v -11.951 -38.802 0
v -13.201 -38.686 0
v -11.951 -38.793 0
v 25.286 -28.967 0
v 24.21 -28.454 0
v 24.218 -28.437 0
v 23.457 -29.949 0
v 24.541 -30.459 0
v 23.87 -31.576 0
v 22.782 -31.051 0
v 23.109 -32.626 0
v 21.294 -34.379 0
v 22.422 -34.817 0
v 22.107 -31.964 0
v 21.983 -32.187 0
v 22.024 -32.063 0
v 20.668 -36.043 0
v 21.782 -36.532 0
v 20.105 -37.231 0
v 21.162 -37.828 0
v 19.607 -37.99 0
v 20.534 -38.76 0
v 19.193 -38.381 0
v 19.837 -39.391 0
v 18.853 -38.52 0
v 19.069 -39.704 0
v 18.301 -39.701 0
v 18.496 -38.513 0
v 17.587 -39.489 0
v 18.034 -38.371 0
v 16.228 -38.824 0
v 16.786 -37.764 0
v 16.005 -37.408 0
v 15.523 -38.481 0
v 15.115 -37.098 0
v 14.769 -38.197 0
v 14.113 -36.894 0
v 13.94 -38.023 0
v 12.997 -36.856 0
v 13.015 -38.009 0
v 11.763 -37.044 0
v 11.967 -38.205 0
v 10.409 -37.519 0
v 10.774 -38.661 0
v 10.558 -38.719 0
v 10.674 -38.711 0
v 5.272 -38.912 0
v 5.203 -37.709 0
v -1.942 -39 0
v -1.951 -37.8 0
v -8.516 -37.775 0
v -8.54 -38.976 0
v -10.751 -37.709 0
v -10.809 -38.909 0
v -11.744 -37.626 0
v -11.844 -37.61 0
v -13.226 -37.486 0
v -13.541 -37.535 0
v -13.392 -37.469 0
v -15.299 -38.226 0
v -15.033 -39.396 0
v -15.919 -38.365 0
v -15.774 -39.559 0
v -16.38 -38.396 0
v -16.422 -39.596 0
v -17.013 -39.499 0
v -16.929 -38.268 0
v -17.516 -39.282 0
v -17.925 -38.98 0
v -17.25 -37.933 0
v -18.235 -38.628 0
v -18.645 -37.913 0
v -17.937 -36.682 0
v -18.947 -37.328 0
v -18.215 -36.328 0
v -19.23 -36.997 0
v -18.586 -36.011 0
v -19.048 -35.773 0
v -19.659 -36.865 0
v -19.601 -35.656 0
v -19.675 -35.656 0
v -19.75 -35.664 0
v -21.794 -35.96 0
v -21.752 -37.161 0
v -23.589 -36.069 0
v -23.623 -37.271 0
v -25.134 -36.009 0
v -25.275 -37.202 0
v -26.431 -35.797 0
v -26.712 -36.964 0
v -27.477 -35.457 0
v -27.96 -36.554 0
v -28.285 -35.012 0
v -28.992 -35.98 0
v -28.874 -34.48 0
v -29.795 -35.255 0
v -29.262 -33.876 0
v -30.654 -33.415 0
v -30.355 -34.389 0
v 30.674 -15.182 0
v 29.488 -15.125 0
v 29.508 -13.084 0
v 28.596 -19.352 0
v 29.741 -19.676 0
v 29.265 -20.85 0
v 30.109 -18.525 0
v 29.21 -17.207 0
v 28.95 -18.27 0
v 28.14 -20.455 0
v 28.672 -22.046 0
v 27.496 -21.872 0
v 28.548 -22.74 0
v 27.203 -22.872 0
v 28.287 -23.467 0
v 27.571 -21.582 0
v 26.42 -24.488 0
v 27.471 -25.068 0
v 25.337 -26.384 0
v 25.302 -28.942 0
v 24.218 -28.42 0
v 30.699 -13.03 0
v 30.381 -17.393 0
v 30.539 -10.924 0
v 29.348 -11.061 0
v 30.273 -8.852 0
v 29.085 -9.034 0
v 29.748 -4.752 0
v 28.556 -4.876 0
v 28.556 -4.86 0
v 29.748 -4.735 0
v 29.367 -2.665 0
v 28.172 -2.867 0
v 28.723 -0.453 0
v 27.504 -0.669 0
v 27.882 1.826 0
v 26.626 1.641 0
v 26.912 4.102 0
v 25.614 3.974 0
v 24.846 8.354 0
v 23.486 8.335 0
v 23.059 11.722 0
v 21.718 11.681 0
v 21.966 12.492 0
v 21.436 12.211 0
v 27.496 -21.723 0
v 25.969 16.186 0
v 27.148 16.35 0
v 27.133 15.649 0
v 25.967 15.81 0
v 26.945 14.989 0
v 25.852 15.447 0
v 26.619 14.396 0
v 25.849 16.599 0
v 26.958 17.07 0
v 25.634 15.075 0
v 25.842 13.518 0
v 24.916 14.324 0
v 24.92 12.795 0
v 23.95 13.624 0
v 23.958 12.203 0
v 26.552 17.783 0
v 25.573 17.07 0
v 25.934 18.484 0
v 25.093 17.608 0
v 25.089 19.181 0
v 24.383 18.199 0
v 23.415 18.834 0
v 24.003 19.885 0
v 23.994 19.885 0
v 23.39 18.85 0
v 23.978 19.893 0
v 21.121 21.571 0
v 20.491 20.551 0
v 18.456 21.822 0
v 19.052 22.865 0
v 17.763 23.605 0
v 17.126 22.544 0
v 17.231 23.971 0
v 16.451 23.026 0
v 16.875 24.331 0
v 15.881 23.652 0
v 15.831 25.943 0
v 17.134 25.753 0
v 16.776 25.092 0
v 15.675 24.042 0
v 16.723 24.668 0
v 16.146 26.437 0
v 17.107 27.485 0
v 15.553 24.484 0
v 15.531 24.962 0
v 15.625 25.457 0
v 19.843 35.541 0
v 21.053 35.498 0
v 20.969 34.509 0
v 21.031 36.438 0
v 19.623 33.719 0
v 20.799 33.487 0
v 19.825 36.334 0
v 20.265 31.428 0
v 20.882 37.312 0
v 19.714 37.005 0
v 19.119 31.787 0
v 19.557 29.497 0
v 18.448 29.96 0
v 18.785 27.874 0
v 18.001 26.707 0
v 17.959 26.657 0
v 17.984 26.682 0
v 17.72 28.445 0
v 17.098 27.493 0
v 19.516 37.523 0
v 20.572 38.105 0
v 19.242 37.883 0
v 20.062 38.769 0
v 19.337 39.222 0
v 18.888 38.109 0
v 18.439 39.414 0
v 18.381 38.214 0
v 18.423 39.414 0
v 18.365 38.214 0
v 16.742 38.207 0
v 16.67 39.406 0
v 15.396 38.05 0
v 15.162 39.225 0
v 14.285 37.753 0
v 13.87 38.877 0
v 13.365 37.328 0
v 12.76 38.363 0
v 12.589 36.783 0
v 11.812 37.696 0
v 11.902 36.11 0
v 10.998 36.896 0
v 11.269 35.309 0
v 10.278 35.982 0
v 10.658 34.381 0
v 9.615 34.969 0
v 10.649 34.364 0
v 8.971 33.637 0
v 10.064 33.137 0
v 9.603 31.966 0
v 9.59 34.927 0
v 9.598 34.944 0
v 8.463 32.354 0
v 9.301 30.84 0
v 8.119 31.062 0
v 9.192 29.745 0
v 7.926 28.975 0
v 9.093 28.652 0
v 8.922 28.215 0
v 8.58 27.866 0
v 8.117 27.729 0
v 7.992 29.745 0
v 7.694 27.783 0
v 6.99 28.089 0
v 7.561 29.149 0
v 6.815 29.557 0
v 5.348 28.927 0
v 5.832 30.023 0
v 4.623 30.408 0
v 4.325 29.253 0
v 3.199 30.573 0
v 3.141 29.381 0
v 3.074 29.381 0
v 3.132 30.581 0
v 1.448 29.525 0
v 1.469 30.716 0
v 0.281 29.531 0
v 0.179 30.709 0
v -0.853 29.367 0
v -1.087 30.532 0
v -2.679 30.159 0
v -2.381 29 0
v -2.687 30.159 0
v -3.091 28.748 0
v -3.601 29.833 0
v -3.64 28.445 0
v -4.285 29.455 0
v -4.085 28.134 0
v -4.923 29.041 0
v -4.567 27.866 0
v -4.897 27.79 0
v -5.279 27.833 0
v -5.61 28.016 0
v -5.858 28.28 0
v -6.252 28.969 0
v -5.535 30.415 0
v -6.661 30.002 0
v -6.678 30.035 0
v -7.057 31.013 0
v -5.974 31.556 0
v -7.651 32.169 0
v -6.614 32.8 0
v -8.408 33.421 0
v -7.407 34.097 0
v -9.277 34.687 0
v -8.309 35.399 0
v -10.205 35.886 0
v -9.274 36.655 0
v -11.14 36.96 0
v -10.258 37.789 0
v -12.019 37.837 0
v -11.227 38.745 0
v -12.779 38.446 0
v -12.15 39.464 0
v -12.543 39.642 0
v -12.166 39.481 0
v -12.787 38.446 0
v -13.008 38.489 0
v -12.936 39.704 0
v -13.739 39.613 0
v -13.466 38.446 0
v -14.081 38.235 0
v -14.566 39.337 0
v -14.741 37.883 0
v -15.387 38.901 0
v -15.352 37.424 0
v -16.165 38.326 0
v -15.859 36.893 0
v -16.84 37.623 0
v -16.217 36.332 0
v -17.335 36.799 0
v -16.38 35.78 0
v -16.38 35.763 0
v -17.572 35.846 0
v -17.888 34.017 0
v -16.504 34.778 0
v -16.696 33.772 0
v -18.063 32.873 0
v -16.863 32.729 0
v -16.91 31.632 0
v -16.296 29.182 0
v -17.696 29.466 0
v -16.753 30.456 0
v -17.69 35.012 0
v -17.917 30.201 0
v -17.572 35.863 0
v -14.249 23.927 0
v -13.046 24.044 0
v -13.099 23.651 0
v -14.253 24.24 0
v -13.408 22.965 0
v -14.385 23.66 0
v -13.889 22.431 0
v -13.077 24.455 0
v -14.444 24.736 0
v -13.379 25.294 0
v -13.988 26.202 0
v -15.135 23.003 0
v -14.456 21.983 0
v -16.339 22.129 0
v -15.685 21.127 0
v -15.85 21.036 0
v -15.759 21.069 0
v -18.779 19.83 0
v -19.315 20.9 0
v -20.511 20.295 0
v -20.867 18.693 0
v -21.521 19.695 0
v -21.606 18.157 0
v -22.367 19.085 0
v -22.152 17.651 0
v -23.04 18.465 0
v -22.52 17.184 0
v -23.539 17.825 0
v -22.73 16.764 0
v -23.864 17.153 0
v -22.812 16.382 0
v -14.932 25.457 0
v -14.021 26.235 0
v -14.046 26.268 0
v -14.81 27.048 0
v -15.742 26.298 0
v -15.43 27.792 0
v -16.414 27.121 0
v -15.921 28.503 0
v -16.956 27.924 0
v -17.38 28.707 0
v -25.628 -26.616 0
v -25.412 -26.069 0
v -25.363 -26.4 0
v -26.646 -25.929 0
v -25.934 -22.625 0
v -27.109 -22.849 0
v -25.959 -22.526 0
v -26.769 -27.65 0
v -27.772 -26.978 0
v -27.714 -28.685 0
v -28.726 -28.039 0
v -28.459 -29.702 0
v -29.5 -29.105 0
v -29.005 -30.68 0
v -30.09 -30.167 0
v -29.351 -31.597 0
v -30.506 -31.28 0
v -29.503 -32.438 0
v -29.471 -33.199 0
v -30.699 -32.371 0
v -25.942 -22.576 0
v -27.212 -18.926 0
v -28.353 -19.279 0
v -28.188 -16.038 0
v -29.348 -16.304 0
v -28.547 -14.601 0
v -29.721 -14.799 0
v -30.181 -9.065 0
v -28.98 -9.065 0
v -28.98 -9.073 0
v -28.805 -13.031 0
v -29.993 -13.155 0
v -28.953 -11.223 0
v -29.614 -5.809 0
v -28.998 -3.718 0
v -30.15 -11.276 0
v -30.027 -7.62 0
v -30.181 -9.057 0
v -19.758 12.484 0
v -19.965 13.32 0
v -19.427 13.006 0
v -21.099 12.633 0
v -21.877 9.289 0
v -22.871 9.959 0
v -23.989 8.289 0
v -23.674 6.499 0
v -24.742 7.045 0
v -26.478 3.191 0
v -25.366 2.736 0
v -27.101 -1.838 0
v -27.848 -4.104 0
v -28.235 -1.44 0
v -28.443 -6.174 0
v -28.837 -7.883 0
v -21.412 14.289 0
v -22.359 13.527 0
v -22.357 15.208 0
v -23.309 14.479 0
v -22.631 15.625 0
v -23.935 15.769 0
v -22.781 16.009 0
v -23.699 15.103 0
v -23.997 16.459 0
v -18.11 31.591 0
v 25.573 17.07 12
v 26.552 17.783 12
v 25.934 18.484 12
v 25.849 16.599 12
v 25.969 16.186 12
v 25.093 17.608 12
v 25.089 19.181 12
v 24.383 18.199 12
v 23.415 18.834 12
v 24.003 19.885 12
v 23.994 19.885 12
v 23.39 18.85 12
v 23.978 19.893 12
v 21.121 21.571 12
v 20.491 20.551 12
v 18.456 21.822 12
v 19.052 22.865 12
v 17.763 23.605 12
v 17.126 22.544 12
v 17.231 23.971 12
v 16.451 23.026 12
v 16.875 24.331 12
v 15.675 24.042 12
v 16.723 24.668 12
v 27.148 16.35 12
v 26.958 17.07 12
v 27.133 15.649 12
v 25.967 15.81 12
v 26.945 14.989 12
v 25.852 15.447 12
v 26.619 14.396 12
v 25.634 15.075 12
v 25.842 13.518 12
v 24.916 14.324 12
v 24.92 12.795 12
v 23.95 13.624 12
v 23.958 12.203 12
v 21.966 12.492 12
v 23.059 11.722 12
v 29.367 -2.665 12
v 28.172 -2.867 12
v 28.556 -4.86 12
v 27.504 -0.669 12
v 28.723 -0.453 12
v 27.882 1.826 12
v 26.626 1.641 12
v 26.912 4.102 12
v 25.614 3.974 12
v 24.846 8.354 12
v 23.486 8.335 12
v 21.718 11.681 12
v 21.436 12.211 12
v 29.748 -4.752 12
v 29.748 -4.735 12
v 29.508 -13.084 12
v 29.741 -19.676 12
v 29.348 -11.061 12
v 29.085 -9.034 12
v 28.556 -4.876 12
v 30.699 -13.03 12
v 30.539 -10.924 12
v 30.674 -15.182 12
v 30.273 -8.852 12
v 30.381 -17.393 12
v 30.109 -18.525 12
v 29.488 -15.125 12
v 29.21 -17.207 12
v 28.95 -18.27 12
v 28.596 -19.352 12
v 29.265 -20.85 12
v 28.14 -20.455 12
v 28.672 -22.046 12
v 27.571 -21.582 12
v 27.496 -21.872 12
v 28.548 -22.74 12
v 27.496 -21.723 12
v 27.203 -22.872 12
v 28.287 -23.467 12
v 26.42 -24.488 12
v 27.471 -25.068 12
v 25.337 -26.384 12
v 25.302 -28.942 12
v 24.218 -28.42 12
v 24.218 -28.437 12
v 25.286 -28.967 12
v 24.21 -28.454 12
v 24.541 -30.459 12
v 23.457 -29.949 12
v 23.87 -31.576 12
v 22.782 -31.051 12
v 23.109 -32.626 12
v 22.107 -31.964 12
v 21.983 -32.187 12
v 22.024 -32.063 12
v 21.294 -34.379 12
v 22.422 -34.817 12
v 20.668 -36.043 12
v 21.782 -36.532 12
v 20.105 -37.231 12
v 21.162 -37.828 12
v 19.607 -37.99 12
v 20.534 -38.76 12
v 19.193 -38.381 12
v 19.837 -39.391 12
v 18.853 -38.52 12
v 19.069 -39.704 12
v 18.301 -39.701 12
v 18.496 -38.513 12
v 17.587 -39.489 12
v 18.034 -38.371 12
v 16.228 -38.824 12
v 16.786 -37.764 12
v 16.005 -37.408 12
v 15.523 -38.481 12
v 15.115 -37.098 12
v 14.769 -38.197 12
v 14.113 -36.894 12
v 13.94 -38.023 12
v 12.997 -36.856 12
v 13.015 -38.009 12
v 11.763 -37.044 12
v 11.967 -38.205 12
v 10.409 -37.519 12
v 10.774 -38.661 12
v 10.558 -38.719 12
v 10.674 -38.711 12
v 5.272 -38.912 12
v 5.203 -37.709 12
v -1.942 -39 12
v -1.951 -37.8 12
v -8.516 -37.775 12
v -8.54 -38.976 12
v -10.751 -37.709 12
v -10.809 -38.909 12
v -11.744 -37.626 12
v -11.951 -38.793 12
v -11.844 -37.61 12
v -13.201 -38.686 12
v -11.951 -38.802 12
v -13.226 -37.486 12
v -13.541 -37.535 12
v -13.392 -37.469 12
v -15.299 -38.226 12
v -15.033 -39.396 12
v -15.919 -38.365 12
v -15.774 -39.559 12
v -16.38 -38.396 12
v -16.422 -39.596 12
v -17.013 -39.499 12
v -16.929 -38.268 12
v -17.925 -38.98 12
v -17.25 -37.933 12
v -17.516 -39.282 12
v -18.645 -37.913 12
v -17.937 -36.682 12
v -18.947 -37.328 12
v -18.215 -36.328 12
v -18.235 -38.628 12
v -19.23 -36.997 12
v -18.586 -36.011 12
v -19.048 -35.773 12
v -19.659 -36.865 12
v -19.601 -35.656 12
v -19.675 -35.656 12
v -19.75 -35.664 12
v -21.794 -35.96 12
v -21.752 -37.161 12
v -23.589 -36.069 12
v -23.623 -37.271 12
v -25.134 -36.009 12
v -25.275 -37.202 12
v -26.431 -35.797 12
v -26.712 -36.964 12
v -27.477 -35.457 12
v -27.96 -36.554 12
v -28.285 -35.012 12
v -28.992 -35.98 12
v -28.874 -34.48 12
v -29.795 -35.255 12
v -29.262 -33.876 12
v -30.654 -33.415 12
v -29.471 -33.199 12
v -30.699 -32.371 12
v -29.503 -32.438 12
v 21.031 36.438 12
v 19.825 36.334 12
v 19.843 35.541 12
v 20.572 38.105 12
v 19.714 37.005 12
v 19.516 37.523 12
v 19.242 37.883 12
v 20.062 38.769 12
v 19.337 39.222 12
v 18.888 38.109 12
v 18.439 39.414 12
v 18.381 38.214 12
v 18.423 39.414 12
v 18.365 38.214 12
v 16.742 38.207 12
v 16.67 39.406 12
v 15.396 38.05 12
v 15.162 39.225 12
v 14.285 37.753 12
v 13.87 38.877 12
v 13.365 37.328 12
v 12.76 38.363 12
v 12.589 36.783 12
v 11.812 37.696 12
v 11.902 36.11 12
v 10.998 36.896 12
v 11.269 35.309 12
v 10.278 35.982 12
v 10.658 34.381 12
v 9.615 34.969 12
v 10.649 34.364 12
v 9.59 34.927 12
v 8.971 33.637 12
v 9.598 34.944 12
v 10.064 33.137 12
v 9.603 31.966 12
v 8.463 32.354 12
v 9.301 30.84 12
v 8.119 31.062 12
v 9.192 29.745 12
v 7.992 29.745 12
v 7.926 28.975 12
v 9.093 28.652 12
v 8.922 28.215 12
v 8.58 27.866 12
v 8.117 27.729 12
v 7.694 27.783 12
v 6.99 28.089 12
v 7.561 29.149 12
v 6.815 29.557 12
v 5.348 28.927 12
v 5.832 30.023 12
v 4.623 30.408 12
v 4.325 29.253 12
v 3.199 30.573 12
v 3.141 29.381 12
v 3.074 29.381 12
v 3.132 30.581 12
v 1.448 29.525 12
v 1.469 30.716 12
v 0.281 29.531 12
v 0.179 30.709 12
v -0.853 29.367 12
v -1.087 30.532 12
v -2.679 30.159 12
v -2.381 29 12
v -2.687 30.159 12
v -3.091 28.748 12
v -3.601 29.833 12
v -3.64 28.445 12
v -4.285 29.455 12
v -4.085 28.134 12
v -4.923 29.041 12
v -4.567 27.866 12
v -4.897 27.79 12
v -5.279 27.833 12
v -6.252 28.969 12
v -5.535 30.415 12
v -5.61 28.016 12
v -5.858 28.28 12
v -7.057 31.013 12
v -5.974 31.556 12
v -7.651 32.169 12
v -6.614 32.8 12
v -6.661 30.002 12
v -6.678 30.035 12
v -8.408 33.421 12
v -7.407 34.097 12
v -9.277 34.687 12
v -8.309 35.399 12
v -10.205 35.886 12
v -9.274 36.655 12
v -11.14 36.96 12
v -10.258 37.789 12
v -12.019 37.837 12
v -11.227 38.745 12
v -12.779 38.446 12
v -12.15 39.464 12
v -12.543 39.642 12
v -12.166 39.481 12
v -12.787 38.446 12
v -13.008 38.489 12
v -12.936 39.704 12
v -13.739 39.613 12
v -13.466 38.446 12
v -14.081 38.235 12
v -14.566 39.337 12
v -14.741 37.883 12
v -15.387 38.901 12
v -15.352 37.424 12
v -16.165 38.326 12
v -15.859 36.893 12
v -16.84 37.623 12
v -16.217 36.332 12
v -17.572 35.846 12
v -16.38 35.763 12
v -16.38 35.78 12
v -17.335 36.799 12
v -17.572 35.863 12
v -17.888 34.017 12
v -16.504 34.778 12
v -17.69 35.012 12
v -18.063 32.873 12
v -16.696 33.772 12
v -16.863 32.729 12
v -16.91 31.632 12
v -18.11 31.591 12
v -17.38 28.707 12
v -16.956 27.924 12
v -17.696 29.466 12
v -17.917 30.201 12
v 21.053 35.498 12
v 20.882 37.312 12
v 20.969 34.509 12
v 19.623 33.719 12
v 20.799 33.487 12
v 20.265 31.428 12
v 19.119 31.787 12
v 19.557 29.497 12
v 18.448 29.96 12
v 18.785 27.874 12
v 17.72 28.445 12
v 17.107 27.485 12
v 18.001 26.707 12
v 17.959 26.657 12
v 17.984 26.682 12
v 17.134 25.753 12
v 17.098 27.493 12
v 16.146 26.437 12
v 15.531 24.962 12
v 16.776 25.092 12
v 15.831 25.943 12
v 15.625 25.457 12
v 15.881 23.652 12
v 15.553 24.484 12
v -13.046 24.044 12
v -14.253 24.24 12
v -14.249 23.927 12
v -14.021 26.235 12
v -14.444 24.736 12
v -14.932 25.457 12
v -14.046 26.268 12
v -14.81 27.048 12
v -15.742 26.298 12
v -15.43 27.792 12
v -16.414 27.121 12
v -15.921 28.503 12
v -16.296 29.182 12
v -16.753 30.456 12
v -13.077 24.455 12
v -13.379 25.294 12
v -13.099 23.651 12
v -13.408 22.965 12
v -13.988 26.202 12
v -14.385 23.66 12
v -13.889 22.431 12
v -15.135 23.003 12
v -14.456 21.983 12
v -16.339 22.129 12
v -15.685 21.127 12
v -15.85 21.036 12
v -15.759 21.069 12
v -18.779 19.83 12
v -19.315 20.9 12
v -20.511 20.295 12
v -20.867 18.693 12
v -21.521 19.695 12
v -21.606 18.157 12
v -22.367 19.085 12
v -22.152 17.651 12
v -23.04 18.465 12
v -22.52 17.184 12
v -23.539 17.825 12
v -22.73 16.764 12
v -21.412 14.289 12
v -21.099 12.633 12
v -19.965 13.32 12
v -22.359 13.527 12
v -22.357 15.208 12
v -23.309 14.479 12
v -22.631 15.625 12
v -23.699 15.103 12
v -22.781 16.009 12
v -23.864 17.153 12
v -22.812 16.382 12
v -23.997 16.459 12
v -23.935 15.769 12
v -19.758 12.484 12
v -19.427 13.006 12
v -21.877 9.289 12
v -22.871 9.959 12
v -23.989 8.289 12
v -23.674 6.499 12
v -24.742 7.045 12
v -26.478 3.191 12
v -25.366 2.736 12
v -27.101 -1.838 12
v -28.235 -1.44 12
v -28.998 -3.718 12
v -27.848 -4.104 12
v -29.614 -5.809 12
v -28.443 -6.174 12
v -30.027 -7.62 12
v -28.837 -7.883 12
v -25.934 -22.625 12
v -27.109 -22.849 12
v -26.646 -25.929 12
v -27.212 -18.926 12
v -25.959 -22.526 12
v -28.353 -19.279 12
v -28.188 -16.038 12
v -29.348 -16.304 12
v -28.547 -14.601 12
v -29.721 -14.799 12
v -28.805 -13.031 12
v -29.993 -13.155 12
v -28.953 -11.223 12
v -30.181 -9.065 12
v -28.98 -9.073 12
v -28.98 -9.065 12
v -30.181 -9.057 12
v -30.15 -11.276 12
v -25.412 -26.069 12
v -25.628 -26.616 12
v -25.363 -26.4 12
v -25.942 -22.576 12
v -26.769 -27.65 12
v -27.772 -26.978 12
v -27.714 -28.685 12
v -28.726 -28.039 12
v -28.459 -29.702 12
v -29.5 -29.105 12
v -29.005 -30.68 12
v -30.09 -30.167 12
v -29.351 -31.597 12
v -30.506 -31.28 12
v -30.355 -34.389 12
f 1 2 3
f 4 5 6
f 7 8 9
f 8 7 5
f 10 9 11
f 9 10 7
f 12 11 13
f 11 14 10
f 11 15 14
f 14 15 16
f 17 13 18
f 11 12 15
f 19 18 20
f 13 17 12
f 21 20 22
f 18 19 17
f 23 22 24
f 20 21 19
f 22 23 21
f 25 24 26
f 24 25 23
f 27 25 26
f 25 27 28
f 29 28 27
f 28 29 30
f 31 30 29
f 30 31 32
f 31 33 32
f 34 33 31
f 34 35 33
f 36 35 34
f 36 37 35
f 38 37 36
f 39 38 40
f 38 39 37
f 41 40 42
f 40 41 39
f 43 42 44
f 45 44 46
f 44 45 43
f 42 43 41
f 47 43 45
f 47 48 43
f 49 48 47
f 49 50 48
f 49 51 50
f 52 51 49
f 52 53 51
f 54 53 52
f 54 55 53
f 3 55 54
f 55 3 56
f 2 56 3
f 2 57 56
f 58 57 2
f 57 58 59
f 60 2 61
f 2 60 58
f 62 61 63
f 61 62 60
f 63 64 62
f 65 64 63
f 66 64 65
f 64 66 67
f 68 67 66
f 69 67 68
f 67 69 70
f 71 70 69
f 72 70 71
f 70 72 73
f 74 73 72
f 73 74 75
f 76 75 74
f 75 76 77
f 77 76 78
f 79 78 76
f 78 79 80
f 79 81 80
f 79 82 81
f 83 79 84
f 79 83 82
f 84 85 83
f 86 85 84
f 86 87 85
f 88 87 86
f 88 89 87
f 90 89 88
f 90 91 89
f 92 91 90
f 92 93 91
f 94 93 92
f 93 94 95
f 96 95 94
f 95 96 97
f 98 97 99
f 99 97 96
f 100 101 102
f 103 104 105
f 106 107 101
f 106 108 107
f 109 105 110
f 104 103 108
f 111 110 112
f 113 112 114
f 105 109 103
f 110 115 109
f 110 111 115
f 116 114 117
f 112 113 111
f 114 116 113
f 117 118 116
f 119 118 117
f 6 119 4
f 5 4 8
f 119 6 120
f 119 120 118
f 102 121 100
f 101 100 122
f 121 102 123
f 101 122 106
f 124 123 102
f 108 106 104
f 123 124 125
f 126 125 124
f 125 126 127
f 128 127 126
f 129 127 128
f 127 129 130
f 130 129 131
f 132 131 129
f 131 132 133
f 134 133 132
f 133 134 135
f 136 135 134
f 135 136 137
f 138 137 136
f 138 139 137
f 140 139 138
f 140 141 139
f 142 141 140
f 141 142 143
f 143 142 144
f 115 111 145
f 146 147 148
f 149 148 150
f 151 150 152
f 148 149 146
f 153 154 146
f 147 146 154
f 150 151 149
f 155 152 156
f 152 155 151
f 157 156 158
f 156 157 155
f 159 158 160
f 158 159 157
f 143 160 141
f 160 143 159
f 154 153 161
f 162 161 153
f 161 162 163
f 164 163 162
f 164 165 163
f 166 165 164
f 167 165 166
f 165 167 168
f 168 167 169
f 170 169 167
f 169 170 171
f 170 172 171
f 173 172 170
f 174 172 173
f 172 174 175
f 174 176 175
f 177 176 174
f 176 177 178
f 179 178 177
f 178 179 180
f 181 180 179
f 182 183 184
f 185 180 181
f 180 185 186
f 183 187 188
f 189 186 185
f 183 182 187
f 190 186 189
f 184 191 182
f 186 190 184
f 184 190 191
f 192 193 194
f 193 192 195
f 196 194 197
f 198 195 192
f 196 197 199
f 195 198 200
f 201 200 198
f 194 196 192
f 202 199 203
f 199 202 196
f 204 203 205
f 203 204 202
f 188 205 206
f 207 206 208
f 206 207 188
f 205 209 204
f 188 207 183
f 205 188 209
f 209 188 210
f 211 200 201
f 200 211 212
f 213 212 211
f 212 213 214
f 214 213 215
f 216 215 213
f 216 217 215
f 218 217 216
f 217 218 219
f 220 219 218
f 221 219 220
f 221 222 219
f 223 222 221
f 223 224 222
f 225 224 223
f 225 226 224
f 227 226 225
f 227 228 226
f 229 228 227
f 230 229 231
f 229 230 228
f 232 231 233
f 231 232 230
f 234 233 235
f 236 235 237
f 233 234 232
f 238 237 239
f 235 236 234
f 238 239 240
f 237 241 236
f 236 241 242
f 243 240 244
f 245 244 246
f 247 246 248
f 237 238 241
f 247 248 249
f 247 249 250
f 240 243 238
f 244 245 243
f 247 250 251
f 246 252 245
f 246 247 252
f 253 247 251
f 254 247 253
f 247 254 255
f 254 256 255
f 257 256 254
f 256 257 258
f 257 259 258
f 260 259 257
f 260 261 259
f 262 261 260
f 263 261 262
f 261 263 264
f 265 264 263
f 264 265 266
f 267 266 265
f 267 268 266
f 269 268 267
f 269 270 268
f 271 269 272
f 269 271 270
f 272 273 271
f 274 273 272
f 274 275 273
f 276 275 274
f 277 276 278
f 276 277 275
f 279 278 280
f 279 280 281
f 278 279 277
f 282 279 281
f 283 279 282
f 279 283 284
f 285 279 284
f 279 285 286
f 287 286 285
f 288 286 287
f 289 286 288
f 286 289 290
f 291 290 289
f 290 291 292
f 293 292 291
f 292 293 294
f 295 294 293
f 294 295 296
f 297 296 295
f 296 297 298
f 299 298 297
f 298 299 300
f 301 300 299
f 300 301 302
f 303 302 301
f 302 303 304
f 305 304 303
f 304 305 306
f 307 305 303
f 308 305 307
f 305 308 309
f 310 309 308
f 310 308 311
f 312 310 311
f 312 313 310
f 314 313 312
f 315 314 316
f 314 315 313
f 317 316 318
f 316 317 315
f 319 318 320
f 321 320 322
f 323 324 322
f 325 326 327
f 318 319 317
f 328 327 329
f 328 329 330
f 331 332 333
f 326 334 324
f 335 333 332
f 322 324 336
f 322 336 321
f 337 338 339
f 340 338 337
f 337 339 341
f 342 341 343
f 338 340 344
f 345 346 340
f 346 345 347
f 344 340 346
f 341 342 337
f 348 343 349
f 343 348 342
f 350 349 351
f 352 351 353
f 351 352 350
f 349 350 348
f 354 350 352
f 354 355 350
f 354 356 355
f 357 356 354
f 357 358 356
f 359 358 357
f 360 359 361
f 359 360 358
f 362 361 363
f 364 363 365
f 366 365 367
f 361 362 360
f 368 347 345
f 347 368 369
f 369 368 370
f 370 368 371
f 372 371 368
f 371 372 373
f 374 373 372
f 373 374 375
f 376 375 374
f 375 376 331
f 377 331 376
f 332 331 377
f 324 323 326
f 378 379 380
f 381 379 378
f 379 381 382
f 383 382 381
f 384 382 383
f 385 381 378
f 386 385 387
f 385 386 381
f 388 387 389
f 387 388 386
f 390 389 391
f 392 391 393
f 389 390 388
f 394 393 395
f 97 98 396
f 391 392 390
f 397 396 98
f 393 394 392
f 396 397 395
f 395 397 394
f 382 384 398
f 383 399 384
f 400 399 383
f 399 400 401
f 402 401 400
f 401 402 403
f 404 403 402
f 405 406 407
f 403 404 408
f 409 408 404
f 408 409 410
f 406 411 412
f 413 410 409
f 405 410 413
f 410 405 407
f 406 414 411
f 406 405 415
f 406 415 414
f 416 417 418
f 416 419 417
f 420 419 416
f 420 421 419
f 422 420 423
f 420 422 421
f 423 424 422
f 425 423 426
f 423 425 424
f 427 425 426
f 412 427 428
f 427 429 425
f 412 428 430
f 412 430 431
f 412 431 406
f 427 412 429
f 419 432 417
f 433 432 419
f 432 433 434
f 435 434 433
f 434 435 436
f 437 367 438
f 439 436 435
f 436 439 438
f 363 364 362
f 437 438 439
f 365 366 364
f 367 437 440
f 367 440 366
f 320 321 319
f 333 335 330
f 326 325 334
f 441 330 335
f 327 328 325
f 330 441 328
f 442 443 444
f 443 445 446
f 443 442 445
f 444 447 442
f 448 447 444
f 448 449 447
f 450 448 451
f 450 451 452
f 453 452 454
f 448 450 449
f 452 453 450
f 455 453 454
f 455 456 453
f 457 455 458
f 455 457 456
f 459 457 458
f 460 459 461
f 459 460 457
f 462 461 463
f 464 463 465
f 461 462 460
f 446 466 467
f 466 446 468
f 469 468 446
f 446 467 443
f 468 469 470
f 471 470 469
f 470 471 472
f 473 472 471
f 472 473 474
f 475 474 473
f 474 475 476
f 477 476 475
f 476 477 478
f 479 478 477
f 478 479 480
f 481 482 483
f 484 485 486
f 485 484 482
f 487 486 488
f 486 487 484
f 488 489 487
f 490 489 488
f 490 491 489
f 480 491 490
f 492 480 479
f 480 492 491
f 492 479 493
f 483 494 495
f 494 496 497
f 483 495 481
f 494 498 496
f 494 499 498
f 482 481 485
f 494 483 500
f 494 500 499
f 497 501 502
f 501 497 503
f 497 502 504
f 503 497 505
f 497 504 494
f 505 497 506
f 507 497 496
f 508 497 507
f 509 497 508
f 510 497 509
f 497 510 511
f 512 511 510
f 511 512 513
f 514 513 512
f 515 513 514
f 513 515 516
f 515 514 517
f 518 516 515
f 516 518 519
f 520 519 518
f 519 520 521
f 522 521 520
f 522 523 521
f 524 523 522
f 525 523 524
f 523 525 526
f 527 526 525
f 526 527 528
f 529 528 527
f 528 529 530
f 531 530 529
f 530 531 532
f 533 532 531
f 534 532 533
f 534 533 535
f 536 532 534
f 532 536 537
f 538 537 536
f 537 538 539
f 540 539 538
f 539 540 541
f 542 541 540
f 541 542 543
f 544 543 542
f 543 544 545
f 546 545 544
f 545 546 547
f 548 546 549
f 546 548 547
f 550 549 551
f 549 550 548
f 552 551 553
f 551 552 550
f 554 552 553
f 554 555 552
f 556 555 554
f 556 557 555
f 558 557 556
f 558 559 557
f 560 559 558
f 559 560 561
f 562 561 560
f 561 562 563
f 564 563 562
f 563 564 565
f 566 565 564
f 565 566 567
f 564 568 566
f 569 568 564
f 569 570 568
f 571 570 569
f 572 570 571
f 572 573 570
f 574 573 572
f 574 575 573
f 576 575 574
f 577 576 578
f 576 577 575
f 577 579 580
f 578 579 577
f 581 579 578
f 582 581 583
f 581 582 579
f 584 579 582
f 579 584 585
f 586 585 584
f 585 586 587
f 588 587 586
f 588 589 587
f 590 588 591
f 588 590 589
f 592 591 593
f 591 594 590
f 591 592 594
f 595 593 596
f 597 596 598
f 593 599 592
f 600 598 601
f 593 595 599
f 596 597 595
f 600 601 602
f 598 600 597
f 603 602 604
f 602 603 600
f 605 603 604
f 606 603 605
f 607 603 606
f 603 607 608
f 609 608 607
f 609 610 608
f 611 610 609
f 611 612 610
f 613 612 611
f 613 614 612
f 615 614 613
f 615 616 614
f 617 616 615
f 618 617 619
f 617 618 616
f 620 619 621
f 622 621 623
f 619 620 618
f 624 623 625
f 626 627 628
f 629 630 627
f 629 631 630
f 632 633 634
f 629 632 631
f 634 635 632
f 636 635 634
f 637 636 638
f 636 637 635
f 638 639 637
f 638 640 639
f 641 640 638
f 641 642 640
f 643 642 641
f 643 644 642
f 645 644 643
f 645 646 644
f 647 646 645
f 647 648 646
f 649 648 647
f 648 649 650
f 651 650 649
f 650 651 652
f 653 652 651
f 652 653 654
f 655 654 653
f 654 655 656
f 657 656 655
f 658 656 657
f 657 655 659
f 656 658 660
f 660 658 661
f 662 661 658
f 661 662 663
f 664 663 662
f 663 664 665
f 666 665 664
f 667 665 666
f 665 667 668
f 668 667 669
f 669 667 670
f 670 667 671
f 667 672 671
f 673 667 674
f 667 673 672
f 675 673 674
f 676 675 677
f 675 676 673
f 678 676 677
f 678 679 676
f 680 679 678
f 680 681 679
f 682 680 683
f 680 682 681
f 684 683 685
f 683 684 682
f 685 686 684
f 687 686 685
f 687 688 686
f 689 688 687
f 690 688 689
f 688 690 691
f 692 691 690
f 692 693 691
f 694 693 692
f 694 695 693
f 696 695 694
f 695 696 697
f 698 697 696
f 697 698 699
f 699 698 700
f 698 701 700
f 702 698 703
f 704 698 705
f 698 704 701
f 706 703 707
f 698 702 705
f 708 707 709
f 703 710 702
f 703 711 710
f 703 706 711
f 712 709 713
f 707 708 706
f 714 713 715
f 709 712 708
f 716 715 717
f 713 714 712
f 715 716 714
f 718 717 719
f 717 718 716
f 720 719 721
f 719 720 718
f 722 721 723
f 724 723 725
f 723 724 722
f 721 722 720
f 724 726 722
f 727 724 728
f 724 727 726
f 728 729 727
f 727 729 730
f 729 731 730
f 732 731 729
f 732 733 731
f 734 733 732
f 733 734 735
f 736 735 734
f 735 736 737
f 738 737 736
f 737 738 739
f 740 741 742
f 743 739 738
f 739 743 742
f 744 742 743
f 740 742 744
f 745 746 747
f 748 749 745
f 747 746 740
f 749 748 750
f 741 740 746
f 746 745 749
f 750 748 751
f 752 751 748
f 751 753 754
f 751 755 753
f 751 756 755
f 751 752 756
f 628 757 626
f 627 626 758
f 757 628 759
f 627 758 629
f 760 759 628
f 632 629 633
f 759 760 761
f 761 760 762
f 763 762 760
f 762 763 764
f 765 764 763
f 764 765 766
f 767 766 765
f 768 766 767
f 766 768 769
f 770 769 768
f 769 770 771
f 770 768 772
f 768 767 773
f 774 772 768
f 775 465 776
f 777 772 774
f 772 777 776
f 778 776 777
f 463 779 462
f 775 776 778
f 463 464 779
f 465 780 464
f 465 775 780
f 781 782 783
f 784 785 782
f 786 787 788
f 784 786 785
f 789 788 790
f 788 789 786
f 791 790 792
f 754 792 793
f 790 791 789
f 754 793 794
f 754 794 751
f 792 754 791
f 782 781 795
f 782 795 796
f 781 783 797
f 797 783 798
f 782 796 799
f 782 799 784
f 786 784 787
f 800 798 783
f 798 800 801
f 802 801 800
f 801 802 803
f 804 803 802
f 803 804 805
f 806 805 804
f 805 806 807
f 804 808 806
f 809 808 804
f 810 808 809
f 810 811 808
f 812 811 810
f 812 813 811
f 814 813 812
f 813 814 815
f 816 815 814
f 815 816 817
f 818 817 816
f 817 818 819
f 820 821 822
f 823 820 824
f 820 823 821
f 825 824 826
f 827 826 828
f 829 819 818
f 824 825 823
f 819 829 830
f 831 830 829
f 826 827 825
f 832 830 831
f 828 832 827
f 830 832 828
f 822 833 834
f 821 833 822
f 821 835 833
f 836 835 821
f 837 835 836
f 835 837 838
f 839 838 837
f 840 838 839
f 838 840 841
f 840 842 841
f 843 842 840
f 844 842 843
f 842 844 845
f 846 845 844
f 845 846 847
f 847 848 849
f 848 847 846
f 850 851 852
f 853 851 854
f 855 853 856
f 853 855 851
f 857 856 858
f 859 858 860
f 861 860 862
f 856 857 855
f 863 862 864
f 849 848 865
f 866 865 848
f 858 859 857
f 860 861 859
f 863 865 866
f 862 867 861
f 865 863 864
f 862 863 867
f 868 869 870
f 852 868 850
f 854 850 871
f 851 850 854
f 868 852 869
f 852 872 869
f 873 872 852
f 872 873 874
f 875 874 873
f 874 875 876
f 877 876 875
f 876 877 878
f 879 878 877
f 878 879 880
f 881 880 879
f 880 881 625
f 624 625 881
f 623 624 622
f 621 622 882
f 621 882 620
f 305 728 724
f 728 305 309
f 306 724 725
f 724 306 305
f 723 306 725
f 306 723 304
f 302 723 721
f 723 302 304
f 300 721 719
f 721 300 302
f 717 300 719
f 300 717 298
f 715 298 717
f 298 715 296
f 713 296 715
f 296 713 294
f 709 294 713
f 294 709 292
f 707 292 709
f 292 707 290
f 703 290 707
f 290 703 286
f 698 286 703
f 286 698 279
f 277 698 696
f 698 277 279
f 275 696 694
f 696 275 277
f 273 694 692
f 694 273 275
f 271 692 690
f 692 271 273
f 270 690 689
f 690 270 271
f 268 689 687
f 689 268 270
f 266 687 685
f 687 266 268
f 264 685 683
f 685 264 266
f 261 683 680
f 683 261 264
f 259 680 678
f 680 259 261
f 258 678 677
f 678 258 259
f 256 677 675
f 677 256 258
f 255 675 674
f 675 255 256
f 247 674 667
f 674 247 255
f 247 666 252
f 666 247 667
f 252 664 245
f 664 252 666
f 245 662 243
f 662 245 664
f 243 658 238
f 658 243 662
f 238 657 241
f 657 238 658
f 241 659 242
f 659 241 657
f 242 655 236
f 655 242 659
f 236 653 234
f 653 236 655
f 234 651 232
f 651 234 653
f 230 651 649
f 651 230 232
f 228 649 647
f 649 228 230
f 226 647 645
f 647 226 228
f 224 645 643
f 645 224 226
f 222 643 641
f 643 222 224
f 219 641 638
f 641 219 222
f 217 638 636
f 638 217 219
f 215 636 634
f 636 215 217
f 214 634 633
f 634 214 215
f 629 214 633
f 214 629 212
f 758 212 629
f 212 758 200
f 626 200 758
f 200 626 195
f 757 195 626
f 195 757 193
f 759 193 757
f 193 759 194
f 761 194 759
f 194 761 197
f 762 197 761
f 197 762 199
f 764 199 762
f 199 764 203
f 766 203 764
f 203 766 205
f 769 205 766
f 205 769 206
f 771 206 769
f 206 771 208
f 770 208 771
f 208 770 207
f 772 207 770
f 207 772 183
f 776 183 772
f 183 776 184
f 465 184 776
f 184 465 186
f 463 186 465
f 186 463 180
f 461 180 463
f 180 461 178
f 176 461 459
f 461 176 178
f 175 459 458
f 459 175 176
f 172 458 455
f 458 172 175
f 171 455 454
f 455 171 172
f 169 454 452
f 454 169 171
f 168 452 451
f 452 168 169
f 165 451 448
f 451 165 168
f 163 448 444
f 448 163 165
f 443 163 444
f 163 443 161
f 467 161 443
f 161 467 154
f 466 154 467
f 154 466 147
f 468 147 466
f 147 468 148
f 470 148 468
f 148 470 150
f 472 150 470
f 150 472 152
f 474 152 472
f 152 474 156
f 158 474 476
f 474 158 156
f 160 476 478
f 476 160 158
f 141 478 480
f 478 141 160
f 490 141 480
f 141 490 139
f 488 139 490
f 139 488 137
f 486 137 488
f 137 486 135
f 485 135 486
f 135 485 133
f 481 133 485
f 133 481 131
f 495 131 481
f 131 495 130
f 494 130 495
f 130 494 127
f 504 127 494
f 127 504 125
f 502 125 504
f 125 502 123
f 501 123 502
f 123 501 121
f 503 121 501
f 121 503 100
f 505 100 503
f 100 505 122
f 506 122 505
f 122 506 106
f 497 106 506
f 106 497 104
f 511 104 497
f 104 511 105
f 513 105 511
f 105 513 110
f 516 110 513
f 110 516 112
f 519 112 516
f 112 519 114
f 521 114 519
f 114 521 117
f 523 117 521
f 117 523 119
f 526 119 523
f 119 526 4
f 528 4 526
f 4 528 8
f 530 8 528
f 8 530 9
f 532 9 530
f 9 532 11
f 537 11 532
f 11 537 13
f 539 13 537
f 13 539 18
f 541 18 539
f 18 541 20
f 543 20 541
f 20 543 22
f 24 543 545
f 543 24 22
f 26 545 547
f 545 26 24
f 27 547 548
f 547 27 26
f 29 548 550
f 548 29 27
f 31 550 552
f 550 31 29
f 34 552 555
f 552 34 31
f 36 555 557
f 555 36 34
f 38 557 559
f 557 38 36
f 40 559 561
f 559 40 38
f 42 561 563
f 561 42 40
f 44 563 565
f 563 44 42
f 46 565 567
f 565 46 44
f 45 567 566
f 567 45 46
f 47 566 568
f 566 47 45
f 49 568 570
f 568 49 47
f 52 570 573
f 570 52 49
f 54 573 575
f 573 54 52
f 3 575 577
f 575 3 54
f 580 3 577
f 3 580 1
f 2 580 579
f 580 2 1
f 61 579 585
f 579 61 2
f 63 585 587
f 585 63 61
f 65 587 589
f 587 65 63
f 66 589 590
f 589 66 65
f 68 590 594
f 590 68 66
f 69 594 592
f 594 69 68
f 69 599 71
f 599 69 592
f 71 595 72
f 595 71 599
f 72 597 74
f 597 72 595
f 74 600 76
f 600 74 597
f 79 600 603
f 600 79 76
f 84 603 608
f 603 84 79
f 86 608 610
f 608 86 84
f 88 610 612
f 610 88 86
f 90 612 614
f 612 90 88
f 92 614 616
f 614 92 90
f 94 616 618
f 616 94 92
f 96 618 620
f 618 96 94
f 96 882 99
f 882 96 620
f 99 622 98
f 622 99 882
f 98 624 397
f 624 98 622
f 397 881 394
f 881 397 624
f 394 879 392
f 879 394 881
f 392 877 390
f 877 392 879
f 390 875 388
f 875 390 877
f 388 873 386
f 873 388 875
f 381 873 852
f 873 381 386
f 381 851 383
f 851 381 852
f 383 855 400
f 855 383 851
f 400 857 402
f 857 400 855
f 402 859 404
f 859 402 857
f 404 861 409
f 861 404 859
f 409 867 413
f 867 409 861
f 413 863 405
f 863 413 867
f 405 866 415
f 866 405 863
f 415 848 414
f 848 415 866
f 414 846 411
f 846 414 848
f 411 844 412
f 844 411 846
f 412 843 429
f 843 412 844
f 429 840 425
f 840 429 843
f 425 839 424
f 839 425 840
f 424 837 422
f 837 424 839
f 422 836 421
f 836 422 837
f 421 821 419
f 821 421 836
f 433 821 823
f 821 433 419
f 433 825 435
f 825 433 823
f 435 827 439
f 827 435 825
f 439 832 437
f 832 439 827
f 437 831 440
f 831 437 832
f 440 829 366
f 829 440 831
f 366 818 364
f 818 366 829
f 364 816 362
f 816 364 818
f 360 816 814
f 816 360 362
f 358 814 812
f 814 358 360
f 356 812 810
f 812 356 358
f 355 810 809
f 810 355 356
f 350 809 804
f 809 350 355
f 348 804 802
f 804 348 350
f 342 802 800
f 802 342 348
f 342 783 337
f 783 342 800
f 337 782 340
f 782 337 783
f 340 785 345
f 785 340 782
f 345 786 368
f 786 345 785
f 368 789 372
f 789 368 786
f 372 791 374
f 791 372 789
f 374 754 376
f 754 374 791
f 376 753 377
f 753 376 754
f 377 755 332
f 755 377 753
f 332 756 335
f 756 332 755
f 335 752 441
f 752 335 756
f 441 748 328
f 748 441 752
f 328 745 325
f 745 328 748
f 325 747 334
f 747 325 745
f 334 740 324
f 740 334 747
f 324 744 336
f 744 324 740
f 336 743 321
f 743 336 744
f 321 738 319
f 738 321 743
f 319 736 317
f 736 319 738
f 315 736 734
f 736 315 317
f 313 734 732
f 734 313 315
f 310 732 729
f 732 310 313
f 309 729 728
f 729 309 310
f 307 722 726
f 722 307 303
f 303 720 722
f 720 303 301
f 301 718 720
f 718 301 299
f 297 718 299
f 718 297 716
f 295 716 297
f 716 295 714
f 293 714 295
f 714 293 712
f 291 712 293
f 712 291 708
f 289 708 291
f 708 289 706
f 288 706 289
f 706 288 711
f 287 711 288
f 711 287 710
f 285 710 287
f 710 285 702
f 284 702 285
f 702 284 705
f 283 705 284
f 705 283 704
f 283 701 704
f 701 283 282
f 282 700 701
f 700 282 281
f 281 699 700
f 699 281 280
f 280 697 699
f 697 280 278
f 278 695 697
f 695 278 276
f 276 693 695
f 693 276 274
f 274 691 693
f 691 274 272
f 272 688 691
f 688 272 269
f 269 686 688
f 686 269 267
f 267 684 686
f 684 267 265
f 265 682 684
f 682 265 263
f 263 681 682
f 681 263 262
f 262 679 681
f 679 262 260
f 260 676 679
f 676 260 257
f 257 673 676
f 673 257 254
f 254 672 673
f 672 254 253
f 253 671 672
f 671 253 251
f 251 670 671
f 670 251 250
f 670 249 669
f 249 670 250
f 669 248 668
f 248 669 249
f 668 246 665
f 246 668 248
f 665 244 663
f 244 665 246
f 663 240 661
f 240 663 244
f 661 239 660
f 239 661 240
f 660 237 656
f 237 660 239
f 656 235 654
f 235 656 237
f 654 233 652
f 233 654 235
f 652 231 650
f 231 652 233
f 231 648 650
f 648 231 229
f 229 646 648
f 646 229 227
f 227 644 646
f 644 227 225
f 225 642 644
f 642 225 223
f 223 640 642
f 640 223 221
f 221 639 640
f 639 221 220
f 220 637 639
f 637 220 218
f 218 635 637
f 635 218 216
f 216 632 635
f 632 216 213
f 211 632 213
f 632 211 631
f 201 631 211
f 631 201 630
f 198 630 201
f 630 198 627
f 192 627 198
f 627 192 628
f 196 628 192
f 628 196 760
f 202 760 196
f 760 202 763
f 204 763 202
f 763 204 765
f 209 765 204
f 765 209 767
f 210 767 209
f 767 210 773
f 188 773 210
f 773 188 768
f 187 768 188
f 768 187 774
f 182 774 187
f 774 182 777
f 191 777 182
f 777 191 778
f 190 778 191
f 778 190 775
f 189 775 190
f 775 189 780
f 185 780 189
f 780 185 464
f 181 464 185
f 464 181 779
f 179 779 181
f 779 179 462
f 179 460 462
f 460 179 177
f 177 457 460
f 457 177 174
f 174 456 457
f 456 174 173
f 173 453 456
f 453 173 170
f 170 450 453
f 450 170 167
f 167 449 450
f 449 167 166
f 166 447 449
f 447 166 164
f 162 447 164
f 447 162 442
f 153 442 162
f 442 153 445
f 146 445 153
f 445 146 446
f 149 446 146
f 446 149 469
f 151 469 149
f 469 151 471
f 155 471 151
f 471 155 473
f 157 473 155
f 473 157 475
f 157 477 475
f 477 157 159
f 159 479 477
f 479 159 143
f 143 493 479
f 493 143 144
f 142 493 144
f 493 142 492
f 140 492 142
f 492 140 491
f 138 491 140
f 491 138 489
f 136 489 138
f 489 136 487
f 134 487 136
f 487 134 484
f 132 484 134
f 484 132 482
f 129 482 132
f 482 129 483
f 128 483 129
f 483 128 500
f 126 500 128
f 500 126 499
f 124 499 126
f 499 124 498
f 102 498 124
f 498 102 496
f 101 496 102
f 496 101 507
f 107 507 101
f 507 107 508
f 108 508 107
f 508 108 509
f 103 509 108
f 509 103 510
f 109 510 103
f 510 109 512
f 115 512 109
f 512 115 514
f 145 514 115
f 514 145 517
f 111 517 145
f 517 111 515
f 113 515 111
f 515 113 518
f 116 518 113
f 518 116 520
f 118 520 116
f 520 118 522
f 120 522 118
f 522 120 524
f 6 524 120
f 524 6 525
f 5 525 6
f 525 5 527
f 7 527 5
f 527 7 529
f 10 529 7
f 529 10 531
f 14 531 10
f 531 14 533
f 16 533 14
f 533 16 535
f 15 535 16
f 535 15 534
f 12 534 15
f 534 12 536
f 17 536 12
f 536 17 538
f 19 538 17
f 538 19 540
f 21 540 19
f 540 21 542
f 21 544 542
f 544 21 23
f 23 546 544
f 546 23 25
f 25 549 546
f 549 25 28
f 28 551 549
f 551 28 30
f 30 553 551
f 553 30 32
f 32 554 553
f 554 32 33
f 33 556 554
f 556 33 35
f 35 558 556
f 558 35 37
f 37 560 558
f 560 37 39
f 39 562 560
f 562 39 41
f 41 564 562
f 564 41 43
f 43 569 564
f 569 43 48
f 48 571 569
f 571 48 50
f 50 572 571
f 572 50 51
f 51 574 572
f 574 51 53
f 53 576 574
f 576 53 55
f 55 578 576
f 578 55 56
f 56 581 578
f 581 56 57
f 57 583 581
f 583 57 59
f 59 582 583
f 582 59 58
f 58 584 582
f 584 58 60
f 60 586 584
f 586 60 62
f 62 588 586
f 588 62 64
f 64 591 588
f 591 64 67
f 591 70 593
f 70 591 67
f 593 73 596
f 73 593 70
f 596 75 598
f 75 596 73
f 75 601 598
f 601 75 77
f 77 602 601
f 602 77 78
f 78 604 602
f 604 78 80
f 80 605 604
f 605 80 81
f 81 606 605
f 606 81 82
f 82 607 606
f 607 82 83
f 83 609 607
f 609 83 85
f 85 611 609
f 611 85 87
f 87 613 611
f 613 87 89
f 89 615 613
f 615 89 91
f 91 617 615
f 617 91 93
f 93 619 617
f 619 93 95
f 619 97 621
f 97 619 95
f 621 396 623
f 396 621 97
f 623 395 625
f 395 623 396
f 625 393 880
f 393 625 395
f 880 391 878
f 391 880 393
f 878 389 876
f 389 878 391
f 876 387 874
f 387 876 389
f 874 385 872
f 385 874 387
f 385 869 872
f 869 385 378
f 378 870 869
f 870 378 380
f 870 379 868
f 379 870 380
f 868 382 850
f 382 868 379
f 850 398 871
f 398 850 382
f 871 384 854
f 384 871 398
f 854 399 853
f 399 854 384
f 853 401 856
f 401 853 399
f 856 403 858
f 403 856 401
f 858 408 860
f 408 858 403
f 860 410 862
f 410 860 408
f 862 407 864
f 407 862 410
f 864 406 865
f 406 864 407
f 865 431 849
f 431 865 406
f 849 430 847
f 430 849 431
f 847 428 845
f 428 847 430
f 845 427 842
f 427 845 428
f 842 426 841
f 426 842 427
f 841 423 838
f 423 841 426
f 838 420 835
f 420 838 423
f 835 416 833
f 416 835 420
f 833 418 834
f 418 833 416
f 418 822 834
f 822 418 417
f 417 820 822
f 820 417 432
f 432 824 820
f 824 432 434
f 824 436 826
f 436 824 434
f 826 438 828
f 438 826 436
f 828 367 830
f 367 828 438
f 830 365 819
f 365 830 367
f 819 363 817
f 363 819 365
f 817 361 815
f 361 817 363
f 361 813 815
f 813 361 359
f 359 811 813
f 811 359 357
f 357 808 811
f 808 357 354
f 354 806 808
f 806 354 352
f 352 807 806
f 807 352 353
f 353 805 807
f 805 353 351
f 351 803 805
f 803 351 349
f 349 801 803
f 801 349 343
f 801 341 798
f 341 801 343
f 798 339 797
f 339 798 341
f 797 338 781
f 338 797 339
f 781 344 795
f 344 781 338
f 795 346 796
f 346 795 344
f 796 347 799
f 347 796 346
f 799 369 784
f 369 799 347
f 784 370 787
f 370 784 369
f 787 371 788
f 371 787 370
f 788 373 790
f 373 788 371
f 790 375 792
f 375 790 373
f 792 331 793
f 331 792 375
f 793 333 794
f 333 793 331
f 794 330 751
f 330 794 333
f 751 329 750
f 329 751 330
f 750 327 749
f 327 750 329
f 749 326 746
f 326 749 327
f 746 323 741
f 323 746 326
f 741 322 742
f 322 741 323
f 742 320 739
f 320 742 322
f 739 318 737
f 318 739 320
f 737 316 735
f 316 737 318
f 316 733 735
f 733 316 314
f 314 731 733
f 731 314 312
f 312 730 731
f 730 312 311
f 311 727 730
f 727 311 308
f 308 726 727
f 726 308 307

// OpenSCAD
// Module names are of the form poly_<inkscape-path-id>().  As a result,
// you can associate a polygon in this OpenSCAD program with the corresponding
// SVG element in the Inkscape document by looking for the XML element with
// the attribute id="inkscape-path-id".

// fudge value is used to ensure that subtracted solids are a tad taller
// in the z dimension than the polygon being subtracted from.  This helps
// keep the resulting .stl file manifold.
fudge = 0.1;

module poly_path299304(h)
{
  scale([25.4/90, -25.4/90, 1]) union()
  {
    difference()
    {
       linear_extrude(height=h)
         polygon([[-45.837548,-140.683937],[-48.682907,-140.361267],[-51.610657,-139.381749],[-54.520293,-137.838578],[-57.276546,-135.802447],[-59.669335,-133.310461],[-61.423621,-130.391176],[-62.264362,-127.073147],[-62.264362,-127.043813],[-62.264362,-127.014480],[-62.680427,-124.058099],[-63.383811,-120.532224],[-64.004142,-116.478110],[-64.171046,-111.937010],[-63.483980,-107.010576],[-62.703925,-104.406612],[-61.581806,-101.716199],[-60.079336,-98.944876],[-58.158227,-96.098179],[-55.780192,-93.181646],[-52.906945,-90.200814],[-51.179173,-87.646432],[-50.501590,-85.888775],[-50.488117,-84.780420],[-50.970927,-83.835423],[-53.628989,-81.505860],[-57.893656,-78.408708],[-68.437423,-74.053404],[-72.676111,-71.912788],[-76.256489,-69.784630],[-79.252182,-67.625602],[-81.636779,-65.428602],[-83.406583,-63.158263],[-84.557897,-60.779215],[-85.028408,-58.319491],[-84.807975,-55.875578],[-83.971166,-53.514795],[-82.592546,-51.304463],[-79.226005,-47.930201],[-74.760475,-44.763071],[-81.037865,-35.288319],[-85.001948,-29.369186],[-87.667258,-24.962892],[-93.818769,-11.305643],[-100.046037,5.104046],[-102.747436,13.173924],[-104.930823,20.583630],[-106.395165,27.000272],[-106.939432,32.090956],[-106.939432,32.120243],[-106.831124,39.954021],[-106.272810,46.613104],[-105.310630,52.437879],[-103.990725,57.768733],[-100.462303,68.310227],[-96.056668,80.960684],[-94.413986,91.872782],[-98.405008,95.590110],[-101.784275,99.351348],[-104.529092,103.128004],[-106.616763,106.891585],[-108.090478,110.834962],[-108.776342,114.698807],[-108.617085,118.399075],[-107.555438,121.851720],[-105.574310,124.918119],[-102.728797,127.488196],[-99.069909,129.520722],[-94.648655,130.974469],[-89.556953,131.818086],[-83.704073,132.060867],[-77.075429,131.672447],[-69.656429,130.622466],[-68.137147,131.091402],[-67.133740,132.265147],[-66.064585,134.337804],[-64.611050,136.870522],[-63.512879,138.117234],[-62.064638,139.188533],[-60.283589,139.958835],[-58.186992,140.302553],[-55.893129,140.169155],[-53.267782,139.593304],[-46.776223,137.075857],[-42.346849,137.486527],[-42.346849,137.457241],[-38.298813,137.867911],[-30.261407,138.102580],[-6.882529,138.190534],[18.681619,137.877020],[37.411204,137.193191],[37.821874,137.163905],[38.173877,136.987903],[42.402534,135.371545],[46.114450,134.677326],[49.395000,134.727465],[52.329561,135.344185],[55.003508,136.349704],[57.502218,137.566243],[62.315429,139.921263],[64.846093,140.673590],[67.566143,140.683937],[70.290045,139.576024],[72.758190,137.339906],[74.981751,134.035121],[77.180776,129.445489],[79.449195,123.369016],[81.880939,115.603710],[84.577939,111.883545],[86.955182,107.926084],[89.595675,102.638260],[89.654342,102.550306],[97.339745,88.822182],[100.228067,83.149963],[101.153832,80.574367],[101.593117,78.115419],[103.694458,73.876276],[105.380381,69.719133],[106.686675,65.638113],[107.649129,61.627338],[108.685678,53.793010],[108.776342,46.169125],[108.207439,38.708659],[107.265284,31.364587],[105.406484,16.837532],[105.406484,16.808246],[105.406484,16.778959],[104.055488,9.441936],[101.773099,1.606386],[98.794772,-6.471625],[95.355961,-14.536030],[88.038697,-29.599749],[81.704937,-41.536234],[84.889985,-43.240677],[88.299437,-45.335483],[91.565001,-47.899353],[94.318384,-51.010986],[95.474469,-53.112320],[96.139784,-55.447572],[96.195068,-57.933220],[95.521062,-60.485739],[94.083656,-63.011113],[91.893708,-65.493078],[88.899413,-67.964728],[85.048967,-70.459162],[85.019681,-70.459162],[84.961013,-70.488449],[74.839793,-76.433688],[67.507523,-81.019210],[62.939087,-83.640494],[61.053908,-84.937529],[59.792786,-86.211257],[59.254834,-87.407018],[59.440783,-88.909948],[60.711315,-91.249821],[63.635488,-94.453998],[63.723441,-94.541999],[63.782109,-94.630000],[66.562182,-98.765667],[69.296825,-104.515422],[71.805140,-111.359053],[73.696865,-118.654217],[74.298486,-122.275295],[74.598442,-125.781108],[74.520944,-129.111506],[73.990201,-132.206339],[72.893553,-135.017103],[71.086175,-137.369052],[68.515482,-138.974662],[65.336789,-139.657073],[65.307503,-139.657073],[65.278216,-139.657073],[59.065191,-139.625847],[53.724884,-138.987578],[49.145198,-137.752715],[45.214035,-135.931706],[41.853621,-133.567085],[38.968301,-130.734417],[36.419156,-127.493700],[34.067268,-123.904931],[34.008600,-123.816930],[33.979314,-123.758263],[31.786731,-119.187454],[29.985962,-114.641678],[28.766523,-110.063486],[28.317929,-105.395430],[28.083261,-102.667406],[26.792582,-103.283411],[24.148581,-104.730954],[20.666131,-106.380703],[16.382205,-107.743151],[11.333776,-108.328790],[11.099107,-108.358124],[5.206495,-108.835740],[0.635067,-108.810998],[-3.852388,-108.185815],[-9.493079,-106.862110],[-9.522365,-106.862110],[-12.758044,-105.706017],[-15.183750,-104.368754],[-17.442437,-102.902074],[-19.613123,-107.771452],[-21.168582,-111.813413],[-23.434471,-116.219669],[-26.246374,-120.816523],[-29.439878,-125.430278],[-32.862120,-129.879192],[-36.347386,-133.898163],[-39.781595,-137.283891],[-43.050668,-139.833075],[-43.079955,-139.862408],[-43.109241,-139.891742],[-44.445034,-140.463494],[-45.837266,-140.683749]]);
       translate([0, 0, -fudge])
         linear_extrude(height=h+2*fudge)
           polygon([[-47.714898,-136.225230],[-46.089630,-136.378318],[-45.309543,-136.225230],[-45.280256,-136.225230],[-42.587404,-134.067532],[-39.471883,-130.959516],[-36.158521,-127.154994],[-32.872144,-122.907776],[-29.791499,-118.421759],[-27.108929,-113.984650],[-25.005278,-109.887734],[-23.661394,-106.422294],[-23.632108,-106.363627],[-23.602821,-106.304960],[-22.151576,-102.646637],[-20.757462,-100.203571],[-19.879557,-99.269158],[-18.704110,-98.619557],[-17.352213,-98.469897],[-16.181421,-98.736891],[-14.473147,-99.686846],[-12.896058,-100.790243],[-10.953611,-101.862936],[-8.437351,-102.755594],[-3.023517,-104.057581],[0.994790,-104.637960],[5.129737,-104.614492],[10.893490,-104.104940],[11.010825,-104.104940],[11.128159,-104.104940],[15.323301,-103.652816],[18.948353,-102.496860],[24.768282,-99.528898],[27.261638,-98.443555],[28.760335,-98.252408],[30.400333,-98.736891],[31.611753,-99.974394],[32.219016,-101.523583],[32.571019,-105.395618],[32.955052,-109.274176],[34.025332,-113.265013],[35.659135,-117.413189],[37.733733,-121.763766],[37.763019,-121.822433],[39.929738,-125.111183],[42.170698,-127.947973],[44.605840,-130.332683],[47.355106,-132.265194],[50.614862,-133.771457],[54.552313,-134.822241],[59.320534,-135.379175],[65.072599,-135.403889],[65.131266,-135.403889],[66.925509,-135.031100],[68.181961,-134.230545],[69.150061,-132.954639],[69.853976,-131.121184],[70.246271,-128.743043],[70.311001,-125.933194],[69.531306,-119.475745],[67.744852,-112.632119],[65.365935,-106.158292],[62.788305,-100.787739],[60.584559,-97.416879],[60.613845,-97.387546],[57.211776,-93.674889],[56.095111,-91.924779],[55.363131,-90.200814],[55.032143,-88.448307],[55.109322,-86.755446],[55.540740,-85.186588],[56.272473,-83.806090],[58.289595,-81.588324],[60.683859,-79.881549],[65.395222,-77.323365],[72.605255,-72.818480],[82.878046,-66.792603],[82.966000,-66.733936],[86.396566,-64.485981],[88.912964,-62.389720],[90.611899,-60.485550],[91.590078,-58.813864],[92.016668,-57.351978],[92.009404,-56.018735],[91.601809,-54.733711],[90.827405,-53.416482],[88.286250,-50.753550],[84.861372,-48.272938],[77.832621,-44.264400],[75.955270,-43.267057],[76.952613,-41.389707],[83.217754,-29.532854],[90.758838,-14.079347],[94.344837,-5.816255],[97.454197,2.371113],[99.821709,10.157793],[101.182165,17.218822],[101.182165,17.277489],[103.056024,32.009116],[103.989947,39.192147],[104.557265,46.359764],[104.484527,53.591797],[103.498281,60.968075],[102.577140,64.735254],[101.325078,68.568430],[99.707914,72.477582],[97.691466,76.472690],[97.427464,76.971361],[97.427464,77.499366],[96.390253,81.043759],[93.614096,86.768783],[89.776817,93.487248],[85.811359,100.702242],[85.811359,100.760910],[85.782073,100.819577],[83.116586,106.120159],[80.722209,110.022505],[78.331339,113.257022],[78.038003,113.609026],[77.891335,114.049030],[75.450744,121.813667],[73.232976,127.712798],[71.239702,131.920758],[69.472592,134.611882],[68.005750,135.997186],[66.803235,136.489232],[65.538269,136.463888],[63.899208,135.961227],[59.479451,133.809166],[56.711242,132.549262],[53.557348,131.451072],[50.007671,130.727815],[46.052114,130.592715],[41.680578,131.258992],[36.882965,132.939867],[18.436272,133.613138],[-6.912097,133.937209],[-30.173641,133.849255],[-38.093712,133.614586],[-41.613744,133.321250],[-41.789746,133.291964],[-41.965747,133.262677],[-46.864458,132.822673],[-47.451130,132.764006],[-47.979135,132.998675],[-54.210361,135.447143],[-56.406817,135.939028],[-58.040559,136.049369],[-59.984486,135.593576],[-61.120587,134.406687],[-63.555275,129.977314],[-64.539665,128.720052],[-65.854750,127.597422],[-67.494112,126.755396],[-69.451329,126.339948],[-69.715331,126.339948],[-69.979333,126.369235],[-77.224343,127.417283],[-83.582838,127.803280],[-89.057633,127.589590],[-93.651547,126.838572],[-97.360643,125.634104],[-100.224066,124.058435],[-102.309252,122.171485],[-103.683638,120.033177],[-104.423375,117.635049],[-104.539028,114.938617],[-103.999650,111.958773],[-102.774296,108.710409],[-100.840041,105.243022],[-98.197597,101.641472],[-94.851475,97.973692],[-90.806188,94.307612],[-89.867513,93.544938],[-90.043515,92.371594],[-91.891531,80.168818],[-91.920818,79.992816],[-91.979485,79.816814],[-96.419509,67.059307],[-99.879733,56.826335],[-101.150660,51.735902],[-102.066524,46.171828],[-102.590621,39.765852],[-102.686248,32.149717],[-102.686248,32.120431],[-102.177134,27.930815],[-100.781460,21.877050],[-98.673498,14.542918],[-96.027522,6.512200],[-89.878104,-9.692877],[-83.883412,-23.026734],[-77.518021,-32.912156],[-70.008620,-44.234925],[-68.835276,-46.082942],[-70.741960,-47.197619],[-75.870923,-50.629836],[-79.219370,-53.885679],[-80.190269,-55.362571],[-80.719210,-56.724181],[-80.828233,-58.045219],[-80.539382,-59.400395],[-79.796857,-60.889724],[-78.489752,-62.544348],[-76.557447,-64.335678],[-73.939322,-66.235124],[-66.540096,-70.262384],[-56.163162,-74.536532],[-55.840492,-74.653866],[-55.576490,-74.859202],[-51.220555,-77.894081],[-49.212186,-79.481577],[-47.509750,-81.371260],[-46.413223,-83.801273],[-46.227639,-85.195416],[-46.336406,-86.651308],[-47.404688,-89.625913],[-49.563102,-92.840697],[-49.680437,-92.958032],[-49.768390,-93.075366],[-52.475708,-95.839033],[-54.674991,-98.475742],[-56.414737,-100.993592],[-57.743444,-103.400687],[-59.361726,-107.915014],[-59.917815,-112.083538],[-59.749256,-115.969069],[-59.158187,-119.663782],[-58.477594,-123.227739],[-58.040465,-126.721003],[-58.040465,-126.779670],[-57.461713,-128.734164],[-56.193557,-130.724178],[-54.396843,-132.604621],[-52.232413,-134.230404],[-49.894909,-135.476604],[-47.715039,-136.225089]]);
    }
  }
}

poly_path299304(12);
